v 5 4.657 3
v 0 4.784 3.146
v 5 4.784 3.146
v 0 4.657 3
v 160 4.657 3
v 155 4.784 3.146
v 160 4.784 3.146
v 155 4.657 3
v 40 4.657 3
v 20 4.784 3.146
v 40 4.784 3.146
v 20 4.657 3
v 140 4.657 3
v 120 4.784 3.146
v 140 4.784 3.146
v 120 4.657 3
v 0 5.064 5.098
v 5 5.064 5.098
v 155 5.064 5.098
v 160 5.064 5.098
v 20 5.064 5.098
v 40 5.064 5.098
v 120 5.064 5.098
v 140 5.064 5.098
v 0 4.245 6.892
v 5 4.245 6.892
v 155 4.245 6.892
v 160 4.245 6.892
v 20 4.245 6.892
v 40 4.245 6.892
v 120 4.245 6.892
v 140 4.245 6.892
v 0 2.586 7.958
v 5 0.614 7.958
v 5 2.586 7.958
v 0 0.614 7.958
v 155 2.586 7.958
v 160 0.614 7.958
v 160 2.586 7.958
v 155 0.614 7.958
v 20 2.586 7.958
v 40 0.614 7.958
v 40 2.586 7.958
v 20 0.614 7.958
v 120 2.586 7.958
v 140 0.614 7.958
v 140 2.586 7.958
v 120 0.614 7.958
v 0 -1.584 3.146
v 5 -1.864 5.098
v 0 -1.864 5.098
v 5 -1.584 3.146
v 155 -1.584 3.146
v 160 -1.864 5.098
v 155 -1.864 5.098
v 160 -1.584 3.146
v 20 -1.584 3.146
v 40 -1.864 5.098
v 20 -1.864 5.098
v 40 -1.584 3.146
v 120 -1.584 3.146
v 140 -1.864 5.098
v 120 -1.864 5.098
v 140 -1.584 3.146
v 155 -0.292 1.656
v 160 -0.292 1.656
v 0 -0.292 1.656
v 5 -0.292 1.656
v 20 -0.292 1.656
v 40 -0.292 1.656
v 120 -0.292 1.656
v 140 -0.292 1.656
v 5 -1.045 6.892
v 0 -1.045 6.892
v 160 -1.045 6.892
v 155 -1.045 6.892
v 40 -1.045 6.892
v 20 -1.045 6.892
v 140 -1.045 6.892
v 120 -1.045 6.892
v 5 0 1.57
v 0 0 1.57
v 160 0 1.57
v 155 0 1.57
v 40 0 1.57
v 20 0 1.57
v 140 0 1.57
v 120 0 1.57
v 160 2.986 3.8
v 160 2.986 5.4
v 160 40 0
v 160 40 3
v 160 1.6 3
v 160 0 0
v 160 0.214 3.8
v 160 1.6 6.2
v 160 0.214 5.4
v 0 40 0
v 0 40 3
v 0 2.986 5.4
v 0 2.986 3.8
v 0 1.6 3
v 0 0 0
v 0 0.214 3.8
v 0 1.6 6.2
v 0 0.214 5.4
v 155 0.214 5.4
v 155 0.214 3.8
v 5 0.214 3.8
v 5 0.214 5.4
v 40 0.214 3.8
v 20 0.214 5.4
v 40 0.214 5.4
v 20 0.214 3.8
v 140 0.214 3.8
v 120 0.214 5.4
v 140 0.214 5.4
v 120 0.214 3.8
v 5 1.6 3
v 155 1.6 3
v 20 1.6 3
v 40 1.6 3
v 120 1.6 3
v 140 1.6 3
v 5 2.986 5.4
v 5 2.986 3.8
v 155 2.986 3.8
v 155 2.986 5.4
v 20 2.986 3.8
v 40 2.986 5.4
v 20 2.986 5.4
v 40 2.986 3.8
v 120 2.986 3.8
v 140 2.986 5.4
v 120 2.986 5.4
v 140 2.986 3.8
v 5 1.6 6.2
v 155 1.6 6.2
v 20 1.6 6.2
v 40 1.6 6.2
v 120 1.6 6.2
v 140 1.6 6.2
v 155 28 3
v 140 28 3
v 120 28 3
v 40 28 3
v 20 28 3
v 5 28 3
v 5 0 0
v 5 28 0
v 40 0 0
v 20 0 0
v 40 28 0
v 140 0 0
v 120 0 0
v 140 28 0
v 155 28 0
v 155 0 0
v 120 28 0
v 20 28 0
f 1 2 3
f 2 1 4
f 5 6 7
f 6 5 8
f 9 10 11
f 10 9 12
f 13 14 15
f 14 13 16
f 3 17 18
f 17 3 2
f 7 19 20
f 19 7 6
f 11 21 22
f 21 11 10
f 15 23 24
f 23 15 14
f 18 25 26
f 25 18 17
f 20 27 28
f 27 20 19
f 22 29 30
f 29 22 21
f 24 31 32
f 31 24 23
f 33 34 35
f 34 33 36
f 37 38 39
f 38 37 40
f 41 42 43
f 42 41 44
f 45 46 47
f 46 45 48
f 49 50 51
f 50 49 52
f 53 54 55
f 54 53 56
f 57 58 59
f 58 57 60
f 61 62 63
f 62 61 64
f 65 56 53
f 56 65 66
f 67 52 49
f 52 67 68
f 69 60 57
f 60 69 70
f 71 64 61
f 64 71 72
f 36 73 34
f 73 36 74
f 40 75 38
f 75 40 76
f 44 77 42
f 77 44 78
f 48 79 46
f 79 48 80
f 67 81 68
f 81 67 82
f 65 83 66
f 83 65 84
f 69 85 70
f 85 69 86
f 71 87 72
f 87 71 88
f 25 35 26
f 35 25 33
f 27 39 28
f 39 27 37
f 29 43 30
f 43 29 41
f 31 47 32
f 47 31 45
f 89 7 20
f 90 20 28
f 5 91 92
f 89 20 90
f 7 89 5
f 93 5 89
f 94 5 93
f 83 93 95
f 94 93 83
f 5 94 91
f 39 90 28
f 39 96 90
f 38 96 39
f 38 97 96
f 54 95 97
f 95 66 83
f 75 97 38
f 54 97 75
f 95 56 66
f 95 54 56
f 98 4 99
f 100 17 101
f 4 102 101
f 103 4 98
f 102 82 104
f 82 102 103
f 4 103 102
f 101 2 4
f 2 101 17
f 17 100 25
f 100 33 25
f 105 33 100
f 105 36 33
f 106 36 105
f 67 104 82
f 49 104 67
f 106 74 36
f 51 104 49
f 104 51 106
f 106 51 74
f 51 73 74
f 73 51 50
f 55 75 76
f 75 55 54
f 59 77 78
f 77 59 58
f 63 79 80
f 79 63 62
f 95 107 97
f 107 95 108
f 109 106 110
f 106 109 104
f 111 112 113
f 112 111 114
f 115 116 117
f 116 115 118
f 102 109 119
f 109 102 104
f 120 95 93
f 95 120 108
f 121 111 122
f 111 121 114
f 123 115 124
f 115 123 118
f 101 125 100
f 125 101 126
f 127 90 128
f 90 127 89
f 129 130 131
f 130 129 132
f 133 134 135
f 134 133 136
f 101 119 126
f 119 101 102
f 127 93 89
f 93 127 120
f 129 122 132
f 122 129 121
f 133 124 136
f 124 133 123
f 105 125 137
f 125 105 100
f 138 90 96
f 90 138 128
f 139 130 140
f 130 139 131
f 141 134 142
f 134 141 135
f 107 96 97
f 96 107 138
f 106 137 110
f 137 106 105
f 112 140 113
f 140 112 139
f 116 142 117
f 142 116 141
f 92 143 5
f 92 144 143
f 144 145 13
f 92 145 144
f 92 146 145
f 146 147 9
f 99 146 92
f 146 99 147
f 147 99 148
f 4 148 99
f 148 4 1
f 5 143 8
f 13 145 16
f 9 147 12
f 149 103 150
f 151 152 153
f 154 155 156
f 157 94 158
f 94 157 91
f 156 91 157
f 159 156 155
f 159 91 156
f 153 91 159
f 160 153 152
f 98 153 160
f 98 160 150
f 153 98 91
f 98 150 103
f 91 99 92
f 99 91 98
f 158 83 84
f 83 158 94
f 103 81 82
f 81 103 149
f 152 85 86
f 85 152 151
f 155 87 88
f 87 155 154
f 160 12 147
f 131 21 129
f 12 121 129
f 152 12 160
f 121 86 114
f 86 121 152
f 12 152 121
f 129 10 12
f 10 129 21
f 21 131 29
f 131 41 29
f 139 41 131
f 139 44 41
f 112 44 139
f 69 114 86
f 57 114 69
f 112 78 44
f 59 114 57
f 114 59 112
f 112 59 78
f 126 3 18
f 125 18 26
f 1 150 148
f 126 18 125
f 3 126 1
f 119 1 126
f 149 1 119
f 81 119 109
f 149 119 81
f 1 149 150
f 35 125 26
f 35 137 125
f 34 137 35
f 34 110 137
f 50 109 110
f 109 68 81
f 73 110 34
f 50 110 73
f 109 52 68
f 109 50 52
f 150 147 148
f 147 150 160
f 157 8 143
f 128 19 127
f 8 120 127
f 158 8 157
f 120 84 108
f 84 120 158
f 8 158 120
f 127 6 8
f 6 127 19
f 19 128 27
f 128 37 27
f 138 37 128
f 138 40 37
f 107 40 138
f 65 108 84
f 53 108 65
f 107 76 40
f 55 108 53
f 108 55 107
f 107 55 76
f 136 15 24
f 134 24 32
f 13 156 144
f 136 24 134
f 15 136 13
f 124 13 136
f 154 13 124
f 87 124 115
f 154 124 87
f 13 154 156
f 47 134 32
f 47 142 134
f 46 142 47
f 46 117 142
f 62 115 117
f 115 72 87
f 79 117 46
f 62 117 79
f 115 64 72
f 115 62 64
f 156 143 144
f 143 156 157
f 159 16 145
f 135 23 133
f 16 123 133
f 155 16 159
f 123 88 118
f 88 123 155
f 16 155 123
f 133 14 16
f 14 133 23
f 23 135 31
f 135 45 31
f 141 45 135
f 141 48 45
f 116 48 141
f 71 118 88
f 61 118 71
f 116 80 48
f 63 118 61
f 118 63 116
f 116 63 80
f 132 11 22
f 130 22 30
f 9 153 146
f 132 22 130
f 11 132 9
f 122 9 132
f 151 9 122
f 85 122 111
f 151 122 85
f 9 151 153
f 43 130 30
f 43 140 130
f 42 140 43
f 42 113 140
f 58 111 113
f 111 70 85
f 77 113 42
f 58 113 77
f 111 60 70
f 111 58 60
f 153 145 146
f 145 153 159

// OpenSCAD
/*

	robo axis bearings

	2015 by ChrisMicro

*/

//$fn=100; // resolution


basePlateLength=40;
basePlateThickness=3;

axisLength=160;
axisDiameter=3.2;
outerDiamter=7;

wheelWidth=15;
wheelDiameter=30;
wheelHolderWidth=5;

axisBearings();

module axisBearings()
{
	difference()
	{
		allBearings();
	
		translate([wheelHolderWidth,-wheelDiameter/2*0.8,0])
			cube(size = [wheelWidth,basePlateLength,wheelDiameter/2], center = false);
	
		translate([axisLength-wheelHolderWidth-wheelWidth,-wheelDiameter/2*0.8,0])
			cube(size = [wheelWidth,basePlateLength,wheelDiameter/2], center = false);

		translate([axisLength/4,-wheelDiameter/2*0.8,0])
			cube(size = [axisLength/2,basePlateLength,wheelDiameter/2], center = false);
	}
}


module allBearings()
{
	//translate([0,axisDiameter/2,(outerDiamter-axisDiameter)])rotate([0,90,0])
	translate([0,axisDiameter/2,basePlateThickness+axisDiameter/2])rotate([0,90,0])
		bearing(axisLength,axisDiameter,outerDiamter);
	
	//cube(size = [axisLength,basePlateLength,(outerDiamter-axisDiameter)/2], center = false);
	cube(size = [axisLength,basePlateLength,basePlateThickness], center = false);

}

module bearing(thickness,innerDiameter,outerDiameter)
{
	difference()
	{
		cylinder(thickness,outerDiameter/2,outerDiameter/2);
		cylinder(thickness,innerDiameter/2,innerDiameter/2);
	}	
}
